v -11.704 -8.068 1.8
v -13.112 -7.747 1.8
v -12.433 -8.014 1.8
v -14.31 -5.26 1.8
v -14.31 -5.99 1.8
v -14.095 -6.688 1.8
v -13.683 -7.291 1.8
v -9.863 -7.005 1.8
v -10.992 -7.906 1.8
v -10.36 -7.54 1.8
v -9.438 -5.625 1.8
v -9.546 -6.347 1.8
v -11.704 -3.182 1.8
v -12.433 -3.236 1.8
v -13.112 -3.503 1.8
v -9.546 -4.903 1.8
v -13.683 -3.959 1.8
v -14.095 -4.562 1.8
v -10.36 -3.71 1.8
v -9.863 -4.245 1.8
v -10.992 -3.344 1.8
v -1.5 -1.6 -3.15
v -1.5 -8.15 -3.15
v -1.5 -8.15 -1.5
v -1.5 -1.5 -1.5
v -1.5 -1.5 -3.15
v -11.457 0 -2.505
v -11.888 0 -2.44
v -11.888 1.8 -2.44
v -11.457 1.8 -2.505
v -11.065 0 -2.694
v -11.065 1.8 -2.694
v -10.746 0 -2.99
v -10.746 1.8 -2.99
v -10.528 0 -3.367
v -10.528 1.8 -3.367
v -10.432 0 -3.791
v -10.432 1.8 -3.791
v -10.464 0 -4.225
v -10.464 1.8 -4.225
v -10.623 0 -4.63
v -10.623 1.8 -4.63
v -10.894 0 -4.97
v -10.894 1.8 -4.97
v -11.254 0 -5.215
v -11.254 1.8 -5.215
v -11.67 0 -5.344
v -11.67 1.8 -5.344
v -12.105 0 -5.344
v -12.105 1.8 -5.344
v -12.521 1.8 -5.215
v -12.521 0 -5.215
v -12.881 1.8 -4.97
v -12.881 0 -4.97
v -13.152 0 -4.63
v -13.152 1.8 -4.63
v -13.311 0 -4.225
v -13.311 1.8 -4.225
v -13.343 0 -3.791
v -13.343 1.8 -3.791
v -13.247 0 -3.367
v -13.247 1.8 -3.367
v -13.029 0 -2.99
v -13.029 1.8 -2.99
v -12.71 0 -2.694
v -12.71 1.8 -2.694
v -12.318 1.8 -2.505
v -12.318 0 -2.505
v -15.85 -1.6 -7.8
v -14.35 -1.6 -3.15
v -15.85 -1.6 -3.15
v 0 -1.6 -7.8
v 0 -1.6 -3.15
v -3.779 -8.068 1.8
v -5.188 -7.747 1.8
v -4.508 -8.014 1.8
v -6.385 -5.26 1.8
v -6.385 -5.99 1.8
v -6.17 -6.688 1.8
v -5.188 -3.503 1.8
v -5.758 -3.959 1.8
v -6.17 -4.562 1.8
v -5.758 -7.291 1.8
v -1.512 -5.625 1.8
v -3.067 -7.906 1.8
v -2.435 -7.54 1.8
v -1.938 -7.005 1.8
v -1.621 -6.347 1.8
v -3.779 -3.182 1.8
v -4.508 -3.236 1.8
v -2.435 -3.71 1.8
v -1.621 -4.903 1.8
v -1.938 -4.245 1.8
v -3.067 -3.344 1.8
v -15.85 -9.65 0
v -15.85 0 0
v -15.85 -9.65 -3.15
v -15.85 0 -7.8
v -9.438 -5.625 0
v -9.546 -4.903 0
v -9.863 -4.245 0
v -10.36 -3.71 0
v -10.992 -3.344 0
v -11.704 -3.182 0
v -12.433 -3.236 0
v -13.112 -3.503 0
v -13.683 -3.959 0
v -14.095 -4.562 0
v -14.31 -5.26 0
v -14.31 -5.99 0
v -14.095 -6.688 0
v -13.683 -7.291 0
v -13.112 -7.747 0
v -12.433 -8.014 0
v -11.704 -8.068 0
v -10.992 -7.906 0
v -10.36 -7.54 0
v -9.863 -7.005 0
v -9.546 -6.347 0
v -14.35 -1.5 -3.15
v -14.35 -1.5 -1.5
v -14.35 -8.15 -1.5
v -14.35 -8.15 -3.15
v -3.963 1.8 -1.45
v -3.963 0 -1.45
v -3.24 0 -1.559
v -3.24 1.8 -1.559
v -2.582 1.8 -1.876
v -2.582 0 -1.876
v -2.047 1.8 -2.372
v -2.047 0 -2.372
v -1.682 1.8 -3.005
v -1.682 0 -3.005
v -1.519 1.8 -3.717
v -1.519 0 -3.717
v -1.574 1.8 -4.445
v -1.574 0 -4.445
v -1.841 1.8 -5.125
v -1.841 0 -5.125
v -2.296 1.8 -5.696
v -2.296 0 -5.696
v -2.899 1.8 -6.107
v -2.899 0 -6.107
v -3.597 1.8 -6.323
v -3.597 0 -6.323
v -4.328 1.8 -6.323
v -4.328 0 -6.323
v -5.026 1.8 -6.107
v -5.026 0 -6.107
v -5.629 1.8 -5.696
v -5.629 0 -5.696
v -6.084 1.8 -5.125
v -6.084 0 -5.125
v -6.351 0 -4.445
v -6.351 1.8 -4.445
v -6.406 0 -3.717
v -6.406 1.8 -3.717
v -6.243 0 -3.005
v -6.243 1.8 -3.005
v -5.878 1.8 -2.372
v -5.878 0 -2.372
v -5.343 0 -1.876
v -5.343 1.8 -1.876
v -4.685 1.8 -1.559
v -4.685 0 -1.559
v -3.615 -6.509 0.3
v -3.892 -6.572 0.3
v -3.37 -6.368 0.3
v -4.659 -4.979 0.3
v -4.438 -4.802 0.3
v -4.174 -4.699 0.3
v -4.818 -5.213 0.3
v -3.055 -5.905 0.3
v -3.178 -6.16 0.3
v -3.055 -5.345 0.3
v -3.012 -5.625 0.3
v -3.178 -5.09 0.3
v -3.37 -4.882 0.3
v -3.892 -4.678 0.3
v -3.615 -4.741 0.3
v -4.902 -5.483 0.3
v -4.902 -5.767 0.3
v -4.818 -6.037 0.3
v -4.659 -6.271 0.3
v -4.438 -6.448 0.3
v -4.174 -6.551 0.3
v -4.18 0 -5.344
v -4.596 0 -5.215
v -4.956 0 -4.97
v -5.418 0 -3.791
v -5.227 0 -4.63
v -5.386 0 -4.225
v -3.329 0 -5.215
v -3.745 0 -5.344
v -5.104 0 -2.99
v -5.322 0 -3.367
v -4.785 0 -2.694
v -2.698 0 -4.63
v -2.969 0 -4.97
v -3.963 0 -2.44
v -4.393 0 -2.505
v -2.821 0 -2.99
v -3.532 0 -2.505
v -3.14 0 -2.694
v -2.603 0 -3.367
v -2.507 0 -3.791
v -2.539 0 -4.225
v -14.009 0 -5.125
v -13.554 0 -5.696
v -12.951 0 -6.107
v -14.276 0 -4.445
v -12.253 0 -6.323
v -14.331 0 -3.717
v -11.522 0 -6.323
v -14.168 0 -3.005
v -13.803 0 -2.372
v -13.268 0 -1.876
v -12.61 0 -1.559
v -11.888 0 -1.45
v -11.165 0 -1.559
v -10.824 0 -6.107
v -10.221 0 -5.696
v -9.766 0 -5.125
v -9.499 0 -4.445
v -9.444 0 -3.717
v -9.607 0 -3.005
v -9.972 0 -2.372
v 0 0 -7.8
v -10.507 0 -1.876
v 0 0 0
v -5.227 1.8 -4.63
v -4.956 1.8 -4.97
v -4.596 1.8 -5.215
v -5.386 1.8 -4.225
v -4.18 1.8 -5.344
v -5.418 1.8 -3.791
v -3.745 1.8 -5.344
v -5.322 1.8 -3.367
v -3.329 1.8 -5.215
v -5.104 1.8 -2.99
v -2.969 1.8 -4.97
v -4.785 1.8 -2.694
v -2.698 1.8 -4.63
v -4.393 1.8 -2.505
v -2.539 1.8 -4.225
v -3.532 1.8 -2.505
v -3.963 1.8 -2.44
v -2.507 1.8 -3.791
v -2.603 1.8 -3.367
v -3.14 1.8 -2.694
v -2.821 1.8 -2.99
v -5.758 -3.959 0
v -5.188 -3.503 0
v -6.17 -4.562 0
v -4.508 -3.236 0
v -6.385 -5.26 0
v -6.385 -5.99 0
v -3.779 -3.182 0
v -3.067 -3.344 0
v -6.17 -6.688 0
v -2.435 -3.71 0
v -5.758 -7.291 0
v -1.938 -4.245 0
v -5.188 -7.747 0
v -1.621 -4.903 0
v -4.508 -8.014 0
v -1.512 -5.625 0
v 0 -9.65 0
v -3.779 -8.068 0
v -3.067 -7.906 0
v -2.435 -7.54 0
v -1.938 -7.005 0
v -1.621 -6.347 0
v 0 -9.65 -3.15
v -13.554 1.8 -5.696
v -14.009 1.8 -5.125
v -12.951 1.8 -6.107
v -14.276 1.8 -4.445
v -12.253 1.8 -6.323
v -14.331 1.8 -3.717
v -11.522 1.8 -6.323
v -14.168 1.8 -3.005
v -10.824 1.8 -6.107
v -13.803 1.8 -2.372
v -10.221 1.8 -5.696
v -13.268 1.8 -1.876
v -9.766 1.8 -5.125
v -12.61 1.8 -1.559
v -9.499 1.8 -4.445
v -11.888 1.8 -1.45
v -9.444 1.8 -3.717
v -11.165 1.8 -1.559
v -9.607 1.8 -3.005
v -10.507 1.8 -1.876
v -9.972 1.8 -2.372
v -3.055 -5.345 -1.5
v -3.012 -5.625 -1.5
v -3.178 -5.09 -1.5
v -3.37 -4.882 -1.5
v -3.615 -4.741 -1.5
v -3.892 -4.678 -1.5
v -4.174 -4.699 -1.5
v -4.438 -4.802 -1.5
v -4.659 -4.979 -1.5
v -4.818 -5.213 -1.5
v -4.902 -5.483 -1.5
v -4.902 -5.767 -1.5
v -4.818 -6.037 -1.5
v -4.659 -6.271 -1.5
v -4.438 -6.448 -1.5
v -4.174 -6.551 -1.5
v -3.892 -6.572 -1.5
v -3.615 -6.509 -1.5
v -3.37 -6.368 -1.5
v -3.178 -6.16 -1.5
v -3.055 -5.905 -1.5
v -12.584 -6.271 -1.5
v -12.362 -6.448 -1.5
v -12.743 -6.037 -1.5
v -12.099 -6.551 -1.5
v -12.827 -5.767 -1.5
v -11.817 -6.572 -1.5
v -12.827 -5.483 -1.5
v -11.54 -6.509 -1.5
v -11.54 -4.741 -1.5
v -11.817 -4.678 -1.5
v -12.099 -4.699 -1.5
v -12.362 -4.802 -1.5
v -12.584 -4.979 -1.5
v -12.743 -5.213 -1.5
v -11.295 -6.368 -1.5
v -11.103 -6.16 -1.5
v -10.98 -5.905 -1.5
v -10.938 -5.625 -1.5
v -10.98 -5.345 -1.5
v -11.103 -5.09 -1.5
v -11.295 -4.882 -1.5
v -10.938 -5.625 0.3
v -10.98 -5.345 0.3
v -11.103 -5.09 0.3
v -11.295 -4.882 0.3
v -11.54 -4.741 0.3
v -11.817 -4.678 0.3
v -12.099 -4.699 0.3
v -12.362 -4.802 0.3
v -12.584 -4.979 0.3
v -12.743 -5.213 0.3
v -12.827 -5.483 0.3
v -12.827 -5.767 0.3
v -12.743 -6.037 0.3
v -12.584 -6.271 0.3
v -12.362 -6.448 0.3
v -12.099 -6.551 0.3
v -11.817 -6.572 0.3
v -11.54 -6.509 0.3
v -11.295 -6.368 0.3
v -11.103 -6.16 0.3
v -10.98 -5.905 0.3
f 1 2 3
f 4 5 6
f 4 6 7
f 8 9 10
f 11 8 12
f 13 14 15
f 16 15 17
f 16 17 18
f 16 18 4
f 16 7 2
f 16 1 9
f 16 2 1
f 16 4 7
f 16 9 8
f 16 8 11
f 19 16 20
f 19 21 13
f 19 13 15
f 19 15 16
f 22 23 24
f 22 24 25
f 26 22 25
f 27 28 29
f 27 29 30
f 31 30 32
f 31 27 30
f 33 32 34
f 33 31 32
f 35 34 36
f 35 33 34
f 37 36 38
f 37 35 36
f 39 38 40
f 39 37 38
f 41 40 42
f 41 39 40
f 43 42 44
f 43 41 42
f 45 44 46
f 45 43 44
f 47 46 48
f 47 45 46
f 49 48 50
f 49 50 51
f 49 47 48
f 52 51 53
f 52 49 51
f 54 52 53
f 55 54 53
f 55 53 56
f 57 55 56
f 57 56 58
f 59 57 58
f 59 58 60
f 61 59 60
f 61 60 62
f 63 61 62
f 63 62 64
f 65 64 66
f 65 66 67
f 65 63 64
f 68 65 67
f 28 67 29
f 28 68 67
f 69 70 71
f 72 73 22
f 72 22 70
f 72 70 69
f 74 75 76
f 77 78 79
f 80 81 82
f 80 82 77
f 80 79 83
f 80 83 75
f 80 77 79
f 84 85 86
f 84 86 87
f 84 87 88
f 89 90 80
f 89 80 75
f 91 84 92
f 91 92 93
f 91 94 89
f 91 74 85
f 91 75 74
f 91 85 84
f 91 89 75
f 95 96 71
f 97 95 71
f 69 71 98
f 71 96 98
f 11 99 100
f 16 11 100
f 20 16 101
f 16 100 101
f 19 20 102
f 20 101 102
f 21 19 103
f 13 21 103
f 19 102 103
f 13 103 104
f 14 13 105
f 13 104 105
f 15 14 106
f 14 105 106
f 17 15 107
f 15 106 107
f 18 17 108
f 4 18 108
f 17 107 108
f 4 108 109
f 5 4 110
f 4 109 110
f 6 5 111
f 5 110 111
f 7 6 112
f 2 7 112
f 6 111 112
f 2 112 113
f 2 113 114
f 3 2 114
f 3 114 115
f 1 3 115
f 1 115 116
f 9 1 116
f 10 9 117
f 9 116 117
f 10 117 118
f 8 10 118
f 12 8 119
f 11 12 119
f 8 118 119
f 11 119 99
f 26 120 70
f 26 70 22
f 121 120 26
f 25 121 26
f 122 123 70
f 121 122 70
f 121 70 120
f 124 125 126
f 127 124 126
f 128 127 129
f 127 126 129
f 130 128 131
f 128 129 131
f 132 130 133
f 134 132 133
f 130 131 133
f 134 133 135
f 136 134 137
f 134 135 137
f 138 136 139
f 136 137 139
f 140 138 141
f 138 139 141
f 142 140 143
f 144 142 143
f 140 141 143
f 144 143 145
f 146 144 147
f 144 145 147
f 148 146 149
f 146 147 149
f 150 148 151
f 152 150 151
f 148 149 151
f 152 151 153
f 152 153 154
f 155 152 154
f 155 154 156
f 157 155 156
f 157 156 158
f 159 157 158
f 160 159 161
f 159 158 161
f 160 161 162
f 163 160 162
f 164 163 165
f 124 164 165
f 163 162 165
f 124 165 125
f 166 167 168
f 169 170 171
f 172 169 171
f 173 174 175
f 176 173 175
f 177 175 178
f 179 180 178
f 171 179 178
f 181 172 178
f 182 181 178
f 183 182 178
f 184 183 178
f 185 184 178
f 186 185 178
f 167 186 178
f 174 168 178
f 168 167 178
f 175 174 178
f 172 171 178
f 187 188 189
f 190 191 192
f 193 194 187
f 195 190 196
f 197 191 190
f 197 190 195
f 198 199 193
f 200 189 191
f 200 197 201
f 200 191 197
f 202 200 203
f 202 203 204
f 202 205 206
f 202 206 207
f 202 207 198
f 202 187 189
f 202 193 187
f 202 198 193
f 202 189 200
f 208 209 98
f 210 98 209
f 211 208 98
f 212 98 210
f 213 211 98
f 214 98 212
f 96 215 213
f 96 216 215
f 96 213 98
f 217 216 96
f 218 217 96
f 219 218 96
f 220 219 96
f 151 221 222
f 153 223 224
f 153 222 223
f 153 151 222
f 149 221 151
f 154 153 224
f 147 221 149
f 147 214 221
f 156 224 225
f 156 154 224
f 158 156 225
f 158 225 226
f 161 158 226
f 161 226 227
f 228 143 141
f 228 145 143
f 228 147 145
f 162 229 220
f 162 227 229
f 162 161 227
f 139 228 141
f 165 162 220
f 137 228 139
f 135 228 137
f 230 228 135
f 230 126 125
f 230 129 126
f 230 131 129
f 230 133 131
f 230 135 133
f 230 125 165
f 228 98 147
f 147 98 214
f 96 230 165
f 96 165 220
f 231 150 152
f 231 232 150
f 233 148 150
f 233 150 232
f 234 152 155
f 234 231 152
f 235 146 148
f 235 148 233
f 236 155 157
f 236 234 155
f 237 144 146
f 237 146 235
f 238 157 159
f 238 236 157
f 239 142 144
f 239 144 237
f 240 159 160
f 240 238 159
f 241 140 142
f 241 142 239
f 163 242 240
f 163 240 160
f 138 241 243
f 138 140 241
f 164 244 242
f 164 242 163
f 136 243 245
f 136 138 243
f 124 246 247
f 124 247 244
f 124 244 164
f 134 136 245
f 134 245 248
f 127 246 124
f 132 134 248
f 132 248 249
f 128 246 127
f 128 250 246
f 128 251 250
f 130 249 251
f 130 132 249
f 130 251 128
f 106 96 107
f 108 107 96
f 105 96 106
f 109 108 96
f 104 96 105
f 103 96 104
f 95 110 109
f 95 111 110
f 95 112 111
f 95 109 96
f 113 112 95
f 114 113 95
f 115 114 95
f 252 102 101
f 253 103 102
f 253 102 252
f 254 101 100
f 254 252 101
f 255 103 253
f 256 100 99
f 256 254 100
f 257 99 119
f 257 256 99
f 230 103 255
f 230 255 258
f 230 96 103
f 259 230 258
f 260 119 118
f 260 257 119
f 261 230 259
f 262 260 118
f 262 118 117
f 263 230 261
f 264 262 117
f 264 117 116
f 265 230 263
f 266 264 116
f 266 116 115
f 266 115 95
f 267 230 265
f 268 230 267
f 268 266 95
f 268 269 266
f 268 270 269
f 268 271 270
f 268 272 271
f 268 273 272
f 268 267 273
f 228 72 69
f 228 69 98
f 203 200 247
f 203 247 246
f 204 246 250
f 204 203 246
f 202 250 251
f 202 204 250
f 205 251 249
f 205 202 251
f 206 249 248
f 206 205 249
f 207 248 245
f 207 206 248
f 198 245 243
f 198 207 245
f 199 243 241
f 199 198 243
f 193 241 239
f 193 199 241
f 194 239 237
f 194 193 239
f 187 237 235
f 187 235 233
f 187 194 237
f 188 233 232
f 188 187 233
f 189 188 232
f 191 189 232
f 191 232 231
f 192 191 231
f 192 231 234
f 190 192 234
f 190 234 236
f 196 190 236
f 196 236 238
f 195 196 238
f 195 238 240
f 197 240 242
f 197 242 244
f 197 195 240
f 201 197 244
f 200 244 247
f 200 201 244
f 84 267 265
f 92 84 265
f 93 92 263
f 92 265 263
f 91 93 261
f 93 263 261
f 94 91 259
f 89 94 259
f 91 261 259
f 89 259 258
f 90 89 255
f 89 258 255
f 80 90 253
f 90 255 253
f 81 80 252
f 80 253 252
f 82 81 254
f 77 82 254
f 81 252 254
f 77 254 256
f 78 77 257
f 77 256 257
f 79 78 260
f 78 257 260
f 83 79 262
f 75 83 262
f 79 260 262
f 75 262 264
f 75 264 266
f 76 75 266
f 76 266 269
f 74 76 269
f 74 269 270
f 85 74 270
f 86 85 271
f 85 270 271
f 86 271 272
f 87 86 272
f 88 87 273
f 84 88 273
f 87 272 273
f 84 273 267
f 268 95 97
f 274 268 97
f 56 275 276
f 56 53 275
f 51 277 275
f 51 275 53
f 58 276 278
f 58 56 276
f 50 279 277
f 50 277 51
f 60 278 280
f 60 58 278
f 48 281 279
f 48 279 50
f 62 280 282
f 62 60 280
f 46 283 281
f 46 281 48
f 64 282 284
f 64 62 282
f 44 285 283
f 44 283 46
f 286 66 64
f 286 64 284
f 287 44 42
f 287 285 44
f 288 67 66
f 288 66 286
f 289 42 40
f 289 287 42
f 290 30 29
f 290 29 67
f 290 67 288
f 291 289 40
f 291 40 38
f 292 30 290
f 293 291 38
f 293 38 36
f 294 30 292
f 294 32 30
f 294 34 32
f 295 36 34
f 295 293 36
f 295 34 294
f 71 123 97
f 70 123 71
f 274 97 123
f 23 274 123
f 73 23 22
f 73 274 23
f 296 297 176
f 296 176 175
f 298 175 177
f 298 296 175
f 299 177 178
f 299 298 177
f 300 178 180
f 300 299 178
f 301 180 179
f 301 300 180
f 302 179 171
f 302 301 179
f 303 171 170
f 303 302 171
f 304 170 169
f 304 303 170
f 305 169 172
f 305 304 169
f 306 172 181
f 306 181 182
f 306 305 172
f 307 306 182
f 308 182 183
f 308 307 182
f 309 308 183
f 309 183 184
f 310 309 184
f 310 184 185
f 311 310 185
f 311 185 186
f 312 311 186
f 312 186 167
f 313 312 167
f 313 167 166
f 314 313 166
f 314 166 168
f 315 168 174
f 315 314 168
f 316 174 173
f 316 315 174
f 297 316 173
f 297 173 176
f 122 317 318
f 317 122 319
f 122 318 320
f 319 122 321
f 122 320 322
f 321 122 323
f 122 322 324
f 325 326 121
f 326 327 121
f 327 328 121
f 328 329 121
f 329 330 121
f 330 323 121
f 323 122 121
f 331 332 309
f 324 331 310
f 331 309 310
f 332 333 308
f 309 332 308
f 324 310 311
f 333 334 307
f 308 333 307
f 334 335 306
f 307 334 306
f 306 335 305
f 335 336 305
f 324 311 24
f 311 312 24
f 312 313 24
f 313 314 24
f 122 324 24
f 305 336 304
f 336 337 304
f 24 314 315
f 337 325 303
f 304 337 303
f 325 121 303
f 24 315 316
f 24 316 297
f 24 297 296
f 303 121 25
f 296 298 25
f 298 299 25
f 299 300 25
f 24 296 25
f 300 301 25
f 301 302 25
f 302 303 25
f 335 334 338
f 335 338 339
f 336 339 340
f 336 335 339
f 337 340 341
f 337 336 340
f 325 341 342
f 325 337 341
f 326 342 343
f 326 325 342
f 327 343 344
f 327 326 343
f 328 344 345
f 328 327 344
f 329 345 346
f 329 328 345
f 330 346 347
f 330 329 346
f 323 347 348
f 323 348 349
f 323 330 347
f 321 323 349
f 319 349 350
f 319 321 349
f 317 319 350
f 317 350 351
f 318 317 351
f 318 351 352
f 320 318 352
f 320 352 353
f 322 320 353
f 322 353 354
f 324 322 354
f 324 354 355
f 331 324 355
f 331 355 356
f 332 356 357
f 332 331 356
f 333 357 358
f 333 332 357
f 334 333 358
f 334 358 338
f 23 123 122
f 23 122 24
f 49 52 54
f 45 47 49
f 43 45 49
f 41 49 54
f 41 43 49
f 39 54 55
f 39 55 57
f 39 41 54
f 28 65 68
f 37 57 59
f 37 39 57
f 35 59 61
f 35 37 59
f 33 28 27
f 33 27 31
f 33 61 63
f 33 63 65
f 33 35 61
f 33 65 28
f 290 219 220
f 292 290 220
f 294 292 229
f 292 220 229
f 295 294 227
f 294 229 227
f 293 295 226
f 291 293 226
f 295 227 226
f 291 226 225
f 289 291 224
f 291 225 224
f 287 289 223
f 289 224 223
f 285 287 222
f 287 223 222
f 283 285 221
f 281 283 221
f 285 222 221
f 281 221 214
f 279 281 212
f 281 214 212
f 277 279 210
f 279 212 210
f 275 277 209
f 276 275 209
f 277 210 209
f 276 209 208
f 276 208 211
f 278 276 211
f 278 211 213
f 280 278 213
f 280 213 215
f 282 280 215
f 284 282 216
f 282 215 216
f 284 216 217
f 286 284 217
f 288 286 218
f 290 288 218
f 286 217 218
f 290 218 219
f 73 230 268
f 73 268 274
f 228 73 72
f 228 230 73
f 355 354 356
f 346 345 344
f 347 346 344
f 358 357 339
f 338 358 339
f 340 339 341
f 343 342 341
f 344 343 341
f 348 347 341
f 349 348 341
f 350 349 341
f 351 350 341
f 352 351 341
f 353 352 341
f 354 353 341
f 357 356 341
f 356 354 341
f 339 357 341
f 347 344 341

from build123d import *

# Parameters (mm, degrees)
BOSS_EXTRUDE1_DEPTH = 15.85
SKETCH2_R           = 2.45
SKETCH2_R_2         = 1.46
BOSS_EXTRUDE2_DEPTH = 1.8
SKETCH3_R           = 2.45
BOSS_EXTRUDE3_DEPTH = 1.8
SHELL1_START        = -3.15
SHELL1_OUTLINE_W    = 12.85
SHELL1_OUTLINE_H    = 6.65
SHELL1_DEPTH        = 1.65
SHELL1_START_2      = -1.5
SHELL1_2_OUTLINE_R  = 0.95
SHELL1_2_DEPTH      = 1.8


# Read off the part's stored shape, not the designer's step: Shell1
with BuildPart() as part:
    # Sketch1 → Boss-Extrude1 (new body)
    with BuildSketch(Plane(origin=(0, 0, 0), x_dir=(0, 0, -1), z_dir=(1, 0, 0))):
        Polygon((0, 0), (0, -9.65), (3.15, -9.65), (3.15, -1.6), (7.8, -1.6), (7.8, 0), align=None)
    extrude(amount=-BOSS_EXTRUDE1_DEPTH)

    # Sketch2 → Boss-Extrude2 (add)
    # profile 1 of 2: a face of its own
    with BuildSketch(Plane(origin=(0, 0, 0), x_dir=(1, 0, 0), z_dir=(0, 1, 0))):
        with Locations(Location((-11.8875, 3.9, 0), (0, 0, 270))):
            Circle(SKETCH2_R)
        with Locations(Location((-11.8875, 3.9, 0), (0, 0, 270))):
            Circle(SKETCH2_R_2, mode=Mode.SUBTRACT)
    # profile 2 of 2: a face of its own
    with BuildSketch(Plane(origin=(0, 0, 0), x_dir=(1, 0, 0), z_dir=(0, 1, 0))):
        with Locations(Location((-3.9625, 3.9, 0), (0, 0, 270))):
            Circle(SKETCH2_R)
        with Locations(Location((-3.9625, 3.9, 0), (0, 0, 270))):
            Circle(SKETCH2_R_2, mode=Mode.SUBTRACT)
    extrude(amount=BOSS_EXTRUDE2_DEPTH)

    # Sketch3 → Boss-Extrude3 (add)
    with BuildSketch(Plane.XY):
        with Locations((-11.8875, -5.625)):
            Circle(SKETCH3_R)
        with Locations((-3.9625, -5.625)):
            Circle(SKETCH3_R)
    extrude(amount=BOSS_EXTRUDE3_DEPTH)

    # Shell1 outline → Shell1 (cut)
    with BuildSketch(Plane.XY.offset(SHELL1_START)):
        with Locations((-7.925, -4.825)):
            Rectangle(SHELL1_OUTLINE_W, SHELL1_OUTLINE_H)
    extrude(amount=SHELL1_DEPTH, mode=Mode.SUBTRACT)

    # Shell1 2 outline → Shell1 2 (cut)
    with BuildSketch(Plane.XY.offset(SHELL1_START_2)):
        with Locations((-11.8875, -5.625)):
            Circle(SHELL1_2_OUTLINE_R)
        with Locations((-3.9625, -5.625)):
            Circle(SHELL1_2_OUTLINE_R)
    extrude(amount=SHELL1_2_DEPTH, mode=Mode.SUBTRACT)


solid = part.part
